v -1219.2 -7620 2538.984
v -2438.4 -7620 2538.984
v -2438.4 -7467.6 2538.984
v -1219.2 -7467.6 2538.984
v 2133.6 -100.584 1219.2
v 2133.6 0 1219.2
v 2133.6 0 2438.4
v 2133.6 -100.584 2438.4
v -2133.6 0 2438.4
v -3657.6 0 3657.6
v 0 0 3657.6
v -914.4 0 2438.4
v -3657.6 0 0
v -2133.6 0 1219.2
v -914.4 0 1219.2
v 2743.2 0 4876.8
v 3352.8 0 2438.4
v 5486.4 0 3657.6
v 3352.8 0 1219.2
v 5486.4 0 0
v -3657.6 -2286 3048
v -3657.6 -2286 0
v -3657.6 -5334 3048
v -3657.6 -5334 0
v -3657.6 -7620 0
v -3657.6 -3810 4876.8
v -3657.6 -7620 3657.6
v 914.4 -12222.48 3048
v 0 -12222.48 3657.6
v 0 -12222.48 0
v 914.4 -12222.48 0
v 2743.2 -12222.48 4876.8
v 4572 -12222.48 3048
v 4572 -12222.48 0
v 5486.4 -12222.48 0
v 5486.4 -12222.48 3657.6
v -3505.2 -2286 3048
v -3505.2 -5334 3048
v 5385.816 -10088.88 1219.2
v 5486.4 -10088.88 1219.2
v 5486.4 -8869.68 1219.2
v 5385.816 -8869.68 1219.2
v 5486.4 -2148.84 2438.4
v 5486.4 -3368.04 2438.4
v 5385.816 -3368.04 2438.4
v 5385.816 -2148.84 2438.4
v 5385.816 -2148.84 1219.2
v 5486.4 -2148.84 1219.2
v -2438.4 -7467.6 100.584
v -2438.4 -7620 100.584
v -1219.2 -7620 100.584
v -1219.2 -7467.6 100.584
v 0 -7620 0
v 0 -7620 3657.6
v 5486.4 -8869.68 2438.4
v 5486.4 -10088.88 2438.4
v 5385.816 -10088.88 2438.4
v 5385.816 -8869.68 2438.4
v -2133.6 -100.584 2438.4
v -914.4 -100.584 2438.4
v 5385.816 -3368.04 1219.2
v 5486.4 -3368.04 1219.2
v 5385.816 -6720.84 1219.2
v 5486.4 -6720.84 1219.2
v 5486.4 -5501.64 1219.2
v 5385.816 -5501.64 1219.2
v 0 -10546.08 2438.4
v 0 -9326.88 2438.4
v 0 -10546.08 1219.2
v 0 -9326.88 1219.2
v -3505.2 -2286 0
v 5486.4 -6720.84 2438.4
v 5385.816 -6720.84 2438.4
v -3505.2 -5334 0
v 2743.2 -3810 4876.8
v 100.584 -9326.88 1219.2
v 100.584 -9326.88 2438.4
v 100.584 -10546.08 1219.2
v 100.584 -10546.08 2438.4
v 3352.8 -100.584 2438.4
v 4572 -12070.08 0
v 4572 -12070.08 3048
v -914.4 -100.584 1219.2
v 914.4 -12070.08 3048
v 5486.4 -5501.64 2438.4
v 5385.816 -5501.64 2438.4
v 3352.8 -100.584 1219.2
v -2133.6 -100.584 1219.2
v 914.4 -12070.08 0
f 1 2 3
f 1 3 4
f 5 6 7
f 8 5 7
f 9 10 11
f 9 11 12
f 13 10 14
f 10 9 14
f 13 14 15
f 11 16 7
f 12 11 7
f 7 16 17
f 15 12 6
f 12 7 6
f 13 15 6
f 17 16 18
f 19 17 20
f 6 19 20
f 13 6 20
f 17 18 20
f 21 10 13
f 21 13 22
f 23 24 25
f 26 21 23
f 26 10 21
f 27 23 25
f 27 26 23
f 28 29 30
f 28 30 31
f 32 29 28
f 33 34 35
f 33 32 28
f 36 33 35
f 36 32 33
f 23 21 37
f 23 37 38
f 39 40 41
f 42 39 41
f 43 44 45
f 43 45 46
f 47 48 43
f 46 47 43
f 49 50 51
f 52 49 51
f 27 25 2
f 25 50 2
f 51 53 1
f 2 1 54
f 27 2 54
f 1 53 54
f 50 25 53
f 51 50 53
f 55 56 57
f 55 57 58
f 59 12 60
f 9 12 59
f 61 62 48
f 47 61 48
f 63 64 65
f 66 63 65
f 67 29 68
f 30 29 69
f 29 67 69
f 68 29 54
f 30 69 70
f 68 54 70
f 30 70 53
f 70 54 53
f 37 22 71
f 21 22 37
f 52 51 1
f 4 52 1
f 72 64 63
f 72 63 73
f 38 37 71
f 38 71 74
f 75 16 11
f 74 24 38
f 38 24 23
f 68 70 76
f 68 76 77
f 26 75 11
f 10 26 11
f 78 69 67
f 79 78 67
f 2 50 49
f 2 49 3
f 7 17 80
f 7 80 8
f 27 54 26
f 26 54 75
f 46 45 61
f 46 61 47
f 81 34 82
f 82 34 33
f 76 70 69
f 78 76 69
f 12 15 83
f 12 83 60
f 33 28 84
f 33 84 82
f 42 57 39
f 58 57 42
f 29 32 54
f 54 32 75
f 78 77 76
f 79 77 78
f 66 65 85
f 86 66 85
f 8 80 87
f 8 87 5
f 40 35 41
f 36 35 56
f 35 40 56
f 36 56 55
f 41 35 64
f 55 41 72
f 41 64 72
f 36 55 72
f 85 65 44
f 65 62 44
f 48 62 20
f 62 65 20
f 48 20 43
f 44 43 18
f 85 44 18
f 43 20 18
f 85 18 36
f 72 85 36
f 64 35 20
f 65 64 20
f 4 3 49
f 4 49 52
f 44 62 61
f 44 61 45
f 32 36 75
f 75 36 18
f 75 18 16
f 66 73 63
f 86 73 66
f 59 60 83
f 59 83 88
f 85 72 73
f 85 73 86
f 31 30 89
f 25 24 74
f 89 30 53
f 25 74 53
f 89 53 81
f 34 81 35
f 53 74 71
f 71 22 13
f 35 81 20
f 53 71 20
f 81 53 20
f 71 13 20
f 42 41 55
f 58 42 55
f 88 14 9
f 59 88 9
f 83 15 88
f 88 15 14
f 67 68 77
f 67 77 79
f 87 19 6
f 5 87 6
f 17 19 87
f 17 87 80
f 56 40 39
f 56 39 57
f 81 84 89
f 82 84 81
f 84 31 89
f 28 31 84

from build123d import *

# Parameters (mm, degrees)
F1_DEPTH      = 12192
F3_DEPTH      = 3657.6
F3_DEPTH_BACK = 2743.2
F4_DEPTH      = 30.48
F5_W          = 3657.6
F5_H          = 3048
F6_DEPTH      = 152.4
F7_W          = 3048
F7_H          = 3048
F8_DEPTH      = 152.4
F9_W          = 1219.2
F9_H          = 2438.4
F10_DEPTH     = 152.4
F11_W         = 1219.2
F11_H         = 1219.2
F12_DEPTH     = 100.584
F13_W         = 1219.2
F13_H         = 1219.2
F14_DEPTH     = 100.584
F15_W         = 1219.2
F15_H         = 1219.2
F16_DEPTH     = 100.584


with BuildPart() as f1:
    # F0 (on Front) → F1 (new body)
    with BuildSketch(Plane.XZ):
        Polygon((0, 3657.6), (0, 0), (5486.4, 0), (5486.4, 3657.6), (2743.2, 4876.8), align=None)
    extrude(amount=F1_DEPTH)

    # F2 (on face) → F3 (join, two sides)
    with BuildSketch(Plane(origin=(0, 0, 0), x_dir=(0, -1, 0), z_dir=(-1, 0, 0))) as f3_sk:
        Polygon((0, 3657.6), (0, 0), (7620, 0), (7620, 3657.6), (3810, 4876.8), align=None)
    extrude(amount=F3_DEPTH)
    extrude(f3_sk.sketch, amount=-F3_DEPTH_BACK)

    # F4 (add): a face of the model
    f4_faces = [f1.faces().sort_by_distance(p)[0] for p in [
        (2743.2, -12192, 2148.1142857143),
    ]]
    extrude(f4_faces, amount=F4_DEPTH)

    # F5 (on face) → F6 (cut)
    with BuildSketch(Plane.XZ.offset(12222.48)):
        with Locations((2743.2, 1524)):
            Rectangle(F5_W, F5_H)
    extrude(amount=-F6_DEPTH, mode=Mode.SUBTRACT)

    # F7 (on face) → F8 (cut)
    with BuildSketch(Plane(origin=(-3657.6, 0, 0), x_dir=(0, -1, 0), z_dir=(-1, 0, 0))):
        with Locations((3810, 1524)):
            Rectangle(F7_W, F7_H)
    extrude(amount=-F8_DEPTH, mode=Mode.SUBTRACT)

    # F9 (on face) → F10 (cut)
    with BuildSketch(Plane.XZ.offset(7620)):
        with Locations((-1828.8, 1319.784)):
            Rectangle(F9_W, F9_H)
    extrude(amount=-F10_DEPTH, mode=Mode.SUBTRACT)

    # F11 (on face) → F12 (cut)
    with BuildSketch(Plane.YZ.offset(5486.4)):
        with Locations((-9479.28, 1828.8)):
            Rectangle(F11_W, F11_H)
        with Locations((-6111.24, 1828.8)):
            Rectangle(F11_W, F11_H)
        with Locations((-2758.44, 1828.8)):
            Rectangle(F11_W, F11_H)
    extrude(amount=-F12_DEPTH, mode=Mode.SUBTRACT)

    # F13 (on face) → F14 (cut)
    with BuildSketch(Plane(origin=(0, 0, 0), x_dir=(-1, 0, 0), z_dir=(0, 1, 0))):
        with Locations((-2743.2, 1828.8)):
            Rectangle(F13_W, F13_H)
        with Locations((1524, 1828.8)):
            Rectangle(F13_W, F13_H)
    extrude(amount=-F14_DEPTH, mode=Mode.SUBTRACT)

    # F15 (on face) → F16 (cut)
    with BuildSketch(Plane(origin=(0, 0, 0), x_dir=(0, -1, 0), z_dir=(-1, 0, 0))):
        with Locations((9936.48, 1828.8)):
            Rectangle(F15_W, F15_H)
    extrude(amount=-F16_DEPTH, mode=Mode.SUBTRACT)


solid = f1.part
